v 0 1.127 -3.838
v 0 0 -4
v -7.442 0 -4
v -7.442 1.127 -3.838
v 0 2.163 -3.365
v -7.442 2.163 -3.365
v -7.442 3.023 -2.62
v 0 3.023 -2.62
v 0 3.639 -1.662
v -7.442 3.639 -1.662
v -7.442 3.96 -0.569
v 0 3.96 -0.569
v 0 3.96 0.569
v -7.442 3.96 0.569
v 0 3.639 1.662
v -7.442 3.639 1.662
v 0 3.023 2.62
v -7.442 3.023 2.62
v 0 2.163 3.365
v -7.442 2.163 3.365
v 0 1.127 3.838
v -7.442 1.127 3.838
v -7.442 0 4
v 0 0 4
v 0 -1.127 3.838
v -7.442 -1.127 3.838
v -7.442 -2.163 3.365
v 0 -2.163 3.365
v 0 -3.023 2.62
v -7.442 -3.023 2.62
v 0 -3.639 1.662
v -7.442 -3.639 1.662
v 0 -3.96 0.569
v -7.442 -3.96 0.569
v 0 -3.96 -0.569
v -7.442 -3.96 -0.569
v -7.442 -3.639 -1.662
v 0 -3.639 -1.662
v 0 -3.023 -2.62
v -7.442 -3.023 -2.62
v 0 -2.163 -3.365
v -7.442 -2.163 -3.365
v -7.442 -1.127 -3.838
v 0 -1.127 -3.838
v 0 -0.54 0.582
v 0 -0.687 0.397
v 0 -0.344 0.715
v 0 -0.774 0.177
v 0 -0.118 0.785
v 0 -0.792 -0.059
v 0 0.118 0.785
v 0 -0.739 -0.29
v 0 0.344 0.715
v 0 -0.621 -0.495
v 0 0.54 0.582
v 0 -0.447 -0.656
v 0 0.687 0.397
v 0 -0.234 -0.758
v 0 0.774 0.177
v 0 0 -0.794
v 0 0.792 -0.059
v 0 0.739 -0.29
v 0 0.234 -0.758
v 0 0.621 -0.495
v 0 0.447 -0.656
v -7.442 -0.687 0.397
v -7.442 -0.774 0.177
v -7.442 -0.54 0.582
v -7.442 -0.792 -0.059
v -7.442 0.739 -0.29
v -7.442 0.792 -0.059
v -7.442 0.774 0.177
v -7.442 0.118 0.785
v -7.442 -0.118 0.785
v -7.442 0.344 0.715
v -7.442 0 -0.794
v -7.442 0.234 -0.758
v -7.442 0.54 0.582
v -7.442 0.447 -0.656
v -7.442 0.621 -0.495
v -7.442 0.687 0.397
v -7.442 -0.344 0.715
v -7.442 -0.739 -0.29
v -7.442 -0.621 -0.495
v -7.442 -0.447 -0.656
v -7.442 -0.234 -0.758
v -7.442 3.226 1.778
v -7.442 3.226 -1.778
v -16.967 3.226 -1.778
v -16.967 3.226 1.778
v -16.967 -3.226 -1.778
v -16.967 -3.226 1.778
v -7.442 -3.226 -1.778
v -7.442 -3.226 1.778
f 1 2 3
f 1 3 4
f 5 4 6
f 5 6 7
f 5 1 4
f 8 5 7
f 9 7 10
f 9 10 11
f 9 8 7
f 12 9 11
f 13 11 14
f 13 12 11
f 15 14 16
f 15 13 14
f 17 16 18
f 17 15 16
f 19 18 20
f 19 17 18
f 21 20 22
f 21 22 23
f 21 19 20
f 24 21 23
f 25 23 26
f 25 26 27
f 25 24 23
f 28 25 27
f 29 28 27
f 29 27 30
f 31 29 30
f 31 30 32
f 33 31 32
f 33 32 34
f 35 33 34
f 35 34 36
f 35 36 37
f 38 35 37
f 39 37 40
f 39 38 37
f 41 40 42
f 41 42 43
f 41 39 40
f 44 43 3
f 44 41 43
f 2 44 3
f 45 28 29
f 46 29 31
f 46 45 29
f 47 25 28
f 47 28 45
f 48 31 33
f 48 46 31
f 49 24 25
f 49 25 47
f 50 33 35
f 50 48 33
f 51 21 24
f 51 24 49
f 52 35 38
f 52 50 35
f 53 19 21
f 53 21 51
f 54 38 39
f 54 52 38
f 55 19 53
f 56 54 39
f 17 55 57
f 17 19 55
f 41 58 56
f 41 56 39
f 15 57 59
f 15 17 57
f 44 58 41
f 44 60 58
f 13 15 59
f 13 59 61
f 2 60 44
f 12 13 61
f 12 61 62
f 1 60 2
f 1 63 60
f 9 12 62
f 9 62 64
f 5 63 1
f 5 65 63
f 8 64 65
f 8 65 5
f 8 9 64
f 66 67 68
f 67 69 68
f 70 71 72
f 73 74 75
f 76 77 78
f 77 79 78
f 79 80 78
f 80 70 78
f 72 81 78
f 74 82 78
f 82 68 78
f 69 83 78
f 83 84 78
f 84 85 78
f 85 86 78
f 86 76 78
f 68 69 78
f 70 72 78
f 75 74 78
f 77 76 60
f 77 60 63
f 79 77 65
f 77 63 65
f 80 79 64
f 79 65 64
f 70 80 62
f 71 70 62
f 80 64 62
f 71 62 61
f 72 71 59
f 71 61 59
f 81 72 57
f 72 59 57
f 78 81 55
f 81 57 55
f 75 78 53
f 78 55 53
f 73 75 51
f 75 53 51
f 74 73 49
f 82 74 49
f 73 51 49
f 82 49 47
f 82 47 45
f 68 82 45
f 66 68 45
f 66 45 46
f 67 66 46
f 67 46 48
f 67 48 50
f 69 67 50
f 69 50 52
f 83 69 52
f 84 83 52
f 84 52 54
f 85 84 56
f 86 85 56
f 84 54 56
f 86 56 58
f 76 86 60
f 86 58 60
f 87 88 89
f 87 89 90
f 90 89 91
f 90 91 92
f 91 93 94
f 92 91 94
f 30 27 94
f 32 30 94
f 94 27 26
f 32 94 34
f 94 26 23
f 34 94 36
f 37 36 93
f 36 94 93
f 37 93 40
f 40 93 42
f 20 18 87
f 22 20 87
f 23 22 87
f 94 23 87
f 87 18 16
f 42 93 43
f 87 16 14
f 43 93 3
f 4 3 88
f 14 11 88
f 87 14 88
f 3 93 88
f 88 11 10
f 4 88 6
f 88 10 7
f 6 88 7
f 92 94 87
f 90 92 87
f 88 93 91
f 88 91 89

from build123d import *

# Parameters (mm, degrees)
SKETCH1_R      = 4.0005
SKETCH1_R_2    = 0.79375
EXTRUDE1_DEPTH = 7.4422
SKETCH4_W      = 3.556
SKETCH4_H      = 6.4516
EXTRUDE2_DEPTH = 9.525


with BuildPart() as part:
    # Sketch1 → Extrude1 (new body)
    with BuildSketch(Plane(origin=(0, 0, 0), x_dir=(0, 0, -1), z_dir=(1, 0, 0))):
        Circle(SKETCH1_R)
        Circle(SKETCH1_R_2, mode=Mode.SUBTRACT)
    extrude(amount=-EXTRUDE1_DEPTH)

    # Sketch4 → Extrude2 (add)
    with BuildSketch(Plane.ZY.offset(7.4422)):
        Rectangle(SKETCH4_W, SKETCH4_H)
    extrude(amount=EXTRUDE2_DEPTH)


solid = part.part
